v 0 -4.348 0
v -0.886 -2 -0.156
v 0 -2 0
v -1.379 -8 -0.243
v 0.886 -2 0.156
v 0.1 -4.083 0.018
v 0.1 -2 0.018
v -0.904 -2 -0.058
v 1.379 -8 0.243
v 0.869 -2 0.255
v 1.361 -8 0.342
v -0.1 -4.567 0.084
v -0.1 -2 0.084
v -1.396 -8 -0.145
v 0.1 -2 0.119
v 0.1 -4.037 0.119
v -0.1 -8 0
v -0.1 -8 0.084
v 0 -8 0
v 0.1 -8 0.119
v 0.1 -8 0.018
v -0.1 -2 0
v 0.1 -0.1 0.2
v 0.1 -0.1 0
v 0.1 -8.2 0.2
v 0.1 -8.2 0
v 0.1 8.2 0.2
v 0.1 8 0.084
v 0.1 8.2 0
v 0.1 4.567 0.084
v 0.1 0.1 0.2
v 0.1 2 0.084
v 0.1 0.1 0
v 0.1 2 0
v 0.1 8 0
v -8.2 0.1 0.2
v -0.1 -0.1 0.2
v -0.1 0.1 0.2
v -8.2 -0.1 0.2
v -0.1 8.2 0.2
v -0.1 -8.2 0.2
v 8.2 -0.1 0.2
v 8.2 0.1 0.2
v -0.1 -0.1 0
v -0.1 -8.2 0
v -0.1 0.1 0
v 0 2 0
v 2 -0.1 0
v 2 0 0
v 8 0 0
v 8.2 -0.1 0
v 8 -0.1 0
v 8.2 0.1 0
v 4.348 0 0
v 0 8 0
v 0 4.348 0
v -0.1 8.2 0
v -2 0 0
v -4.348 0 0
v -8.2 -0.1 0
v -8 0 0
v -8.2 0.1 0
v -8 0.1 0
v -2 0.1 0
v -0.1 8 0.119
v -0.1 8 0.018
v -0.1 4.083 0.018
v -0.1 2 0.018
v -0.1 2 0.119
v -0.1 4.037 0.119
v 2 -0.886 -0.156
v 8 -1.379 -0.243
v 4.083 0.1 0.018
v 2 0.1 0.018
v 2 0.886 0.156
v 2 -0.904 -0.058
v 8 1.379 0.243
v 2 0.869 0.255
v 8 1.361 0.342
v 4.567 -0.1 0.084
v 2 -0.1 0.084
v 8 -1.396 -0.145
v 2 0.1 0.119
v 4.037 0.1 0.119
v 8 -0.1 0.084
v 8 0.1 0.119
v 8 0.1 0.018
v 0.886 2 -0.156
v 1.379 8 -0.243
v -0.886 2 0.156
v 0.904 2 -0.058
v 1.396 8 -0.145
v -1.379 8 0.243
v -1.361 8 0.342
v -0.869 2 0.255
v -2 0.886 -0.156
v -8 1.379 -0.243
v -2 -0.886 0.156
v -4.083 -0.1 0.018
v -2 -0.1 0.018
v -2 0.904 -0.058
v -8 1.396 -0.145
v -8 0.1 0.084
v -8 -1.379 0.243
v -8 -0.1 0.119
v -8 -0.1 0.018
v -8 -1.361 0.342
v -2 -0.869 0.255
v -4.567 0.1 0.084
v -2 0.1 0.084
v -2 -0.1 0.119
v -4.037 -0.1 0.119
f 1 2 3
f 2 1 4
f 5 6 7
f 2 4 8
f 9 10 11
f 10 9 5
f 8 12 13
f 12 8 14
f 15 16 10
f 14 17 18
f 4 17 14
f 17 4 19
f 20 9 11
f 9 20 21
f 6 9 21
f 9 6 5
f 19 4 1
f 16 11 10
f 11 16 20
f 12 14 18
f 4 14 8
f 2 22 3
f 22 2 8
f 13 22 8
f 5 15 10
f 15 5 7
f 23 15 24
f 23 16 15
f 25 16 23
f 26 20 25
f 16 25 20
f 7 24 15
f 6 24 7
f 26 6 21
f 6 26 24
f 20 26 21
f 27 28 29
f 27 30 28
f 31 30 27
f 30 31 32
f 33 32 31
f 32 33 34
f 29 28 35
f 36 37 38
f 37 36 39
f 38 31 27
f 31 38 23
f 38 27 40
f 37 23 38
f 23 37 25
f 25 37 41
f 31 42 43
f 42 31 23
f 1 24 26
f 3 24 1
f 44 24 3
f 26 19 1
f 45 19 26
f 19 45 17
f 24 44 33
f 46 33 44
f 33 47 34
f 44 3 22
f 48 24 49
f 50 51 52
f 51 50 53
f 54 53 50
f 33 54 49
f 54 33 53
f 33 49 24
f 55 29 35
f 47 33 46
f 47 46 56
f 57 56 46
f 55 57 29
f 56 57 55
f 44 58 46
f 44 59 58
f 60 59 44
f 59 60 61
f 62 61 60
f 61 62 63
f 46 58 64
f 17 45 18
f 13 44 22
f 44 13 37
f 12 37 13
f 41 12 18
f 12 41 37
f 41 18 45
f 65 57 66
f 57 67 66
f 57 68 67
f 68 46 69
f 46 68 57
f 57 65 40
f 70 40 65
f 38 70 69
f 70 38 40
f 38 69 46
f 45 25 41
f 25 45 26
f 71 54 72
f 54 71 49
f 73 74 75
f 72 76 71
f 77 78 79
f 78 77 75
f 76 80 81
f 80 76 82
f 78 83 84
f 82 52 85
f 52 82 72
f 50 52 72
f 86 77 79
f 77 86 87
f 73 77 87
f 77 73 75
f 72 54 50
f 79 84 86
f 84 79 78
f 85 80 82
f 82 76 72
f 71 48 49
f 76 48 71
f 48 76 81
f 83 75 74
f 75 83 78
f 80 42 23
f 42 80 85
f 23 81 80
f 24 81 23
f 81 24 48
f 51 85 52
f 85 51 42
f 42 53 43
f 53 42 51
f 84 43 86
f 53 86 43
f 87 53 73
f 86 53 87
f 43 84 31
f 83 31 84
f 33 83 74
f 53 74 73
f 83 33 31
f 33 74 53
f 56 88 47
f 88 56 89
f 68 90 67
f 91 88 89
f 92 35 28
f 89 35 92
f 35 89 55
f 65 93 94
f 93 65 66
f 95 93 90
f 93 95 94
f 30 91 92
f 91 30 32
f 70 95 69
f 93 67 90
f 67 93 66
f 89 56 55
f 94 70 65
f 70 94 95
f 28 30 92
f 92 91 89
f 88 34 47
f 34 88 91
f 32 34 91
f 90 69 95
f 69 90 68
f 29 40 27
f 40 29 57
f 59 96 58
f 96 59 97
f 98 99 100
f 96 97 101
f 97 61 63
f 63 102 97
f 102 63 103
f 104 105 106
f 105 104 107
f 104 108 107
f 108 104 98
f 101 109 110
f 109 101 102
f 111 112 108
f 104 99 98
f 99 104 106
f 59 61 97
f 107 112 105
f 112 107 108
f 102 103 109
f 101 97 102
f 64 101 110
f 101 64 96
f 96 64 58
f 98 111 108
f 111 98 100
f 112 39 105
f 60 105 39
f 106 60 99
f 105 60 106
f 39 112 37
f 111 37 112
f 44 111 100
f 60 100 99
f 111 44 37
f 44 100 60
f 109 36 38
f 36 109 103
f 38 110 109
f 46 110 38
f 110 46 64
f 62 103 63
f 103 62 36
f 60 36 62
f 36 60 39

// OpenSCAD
module lopata(delka, sirkaA, sirkaB, tloustka=0.1) {
  linear_extrude(height=tloustka) 
  polygon(points=[[-sirkaA/2,-delka],[sirkaA/2,-delka],[sirkaB/2,0], [-sirkaB/2,0]]);
}

module vrtule(polomer, tram=0.2) {
  delkaLopaty = 6;
  for (a = [0,90,180,270]) {
    rotate(a, [0,0,1]) rotate(-10, [0,1,0]) translate([0,delkaLopaty-polomer,0]) lopata(delkaLopaty,2.8,1.8);
    rotate(a, [0,0,1]) translate([-tram/2,-polomer-tram, 0]) cube([tram,polomer+tram,tram]);
  }
}

// lopata(6,2.8,1.8);
// polomer = 8;
// tram = 0.2;
// translate([-tram/2,-polomer-tram, 0]) cube([tram,polomer+tram,tram]);
vrtule(8);
